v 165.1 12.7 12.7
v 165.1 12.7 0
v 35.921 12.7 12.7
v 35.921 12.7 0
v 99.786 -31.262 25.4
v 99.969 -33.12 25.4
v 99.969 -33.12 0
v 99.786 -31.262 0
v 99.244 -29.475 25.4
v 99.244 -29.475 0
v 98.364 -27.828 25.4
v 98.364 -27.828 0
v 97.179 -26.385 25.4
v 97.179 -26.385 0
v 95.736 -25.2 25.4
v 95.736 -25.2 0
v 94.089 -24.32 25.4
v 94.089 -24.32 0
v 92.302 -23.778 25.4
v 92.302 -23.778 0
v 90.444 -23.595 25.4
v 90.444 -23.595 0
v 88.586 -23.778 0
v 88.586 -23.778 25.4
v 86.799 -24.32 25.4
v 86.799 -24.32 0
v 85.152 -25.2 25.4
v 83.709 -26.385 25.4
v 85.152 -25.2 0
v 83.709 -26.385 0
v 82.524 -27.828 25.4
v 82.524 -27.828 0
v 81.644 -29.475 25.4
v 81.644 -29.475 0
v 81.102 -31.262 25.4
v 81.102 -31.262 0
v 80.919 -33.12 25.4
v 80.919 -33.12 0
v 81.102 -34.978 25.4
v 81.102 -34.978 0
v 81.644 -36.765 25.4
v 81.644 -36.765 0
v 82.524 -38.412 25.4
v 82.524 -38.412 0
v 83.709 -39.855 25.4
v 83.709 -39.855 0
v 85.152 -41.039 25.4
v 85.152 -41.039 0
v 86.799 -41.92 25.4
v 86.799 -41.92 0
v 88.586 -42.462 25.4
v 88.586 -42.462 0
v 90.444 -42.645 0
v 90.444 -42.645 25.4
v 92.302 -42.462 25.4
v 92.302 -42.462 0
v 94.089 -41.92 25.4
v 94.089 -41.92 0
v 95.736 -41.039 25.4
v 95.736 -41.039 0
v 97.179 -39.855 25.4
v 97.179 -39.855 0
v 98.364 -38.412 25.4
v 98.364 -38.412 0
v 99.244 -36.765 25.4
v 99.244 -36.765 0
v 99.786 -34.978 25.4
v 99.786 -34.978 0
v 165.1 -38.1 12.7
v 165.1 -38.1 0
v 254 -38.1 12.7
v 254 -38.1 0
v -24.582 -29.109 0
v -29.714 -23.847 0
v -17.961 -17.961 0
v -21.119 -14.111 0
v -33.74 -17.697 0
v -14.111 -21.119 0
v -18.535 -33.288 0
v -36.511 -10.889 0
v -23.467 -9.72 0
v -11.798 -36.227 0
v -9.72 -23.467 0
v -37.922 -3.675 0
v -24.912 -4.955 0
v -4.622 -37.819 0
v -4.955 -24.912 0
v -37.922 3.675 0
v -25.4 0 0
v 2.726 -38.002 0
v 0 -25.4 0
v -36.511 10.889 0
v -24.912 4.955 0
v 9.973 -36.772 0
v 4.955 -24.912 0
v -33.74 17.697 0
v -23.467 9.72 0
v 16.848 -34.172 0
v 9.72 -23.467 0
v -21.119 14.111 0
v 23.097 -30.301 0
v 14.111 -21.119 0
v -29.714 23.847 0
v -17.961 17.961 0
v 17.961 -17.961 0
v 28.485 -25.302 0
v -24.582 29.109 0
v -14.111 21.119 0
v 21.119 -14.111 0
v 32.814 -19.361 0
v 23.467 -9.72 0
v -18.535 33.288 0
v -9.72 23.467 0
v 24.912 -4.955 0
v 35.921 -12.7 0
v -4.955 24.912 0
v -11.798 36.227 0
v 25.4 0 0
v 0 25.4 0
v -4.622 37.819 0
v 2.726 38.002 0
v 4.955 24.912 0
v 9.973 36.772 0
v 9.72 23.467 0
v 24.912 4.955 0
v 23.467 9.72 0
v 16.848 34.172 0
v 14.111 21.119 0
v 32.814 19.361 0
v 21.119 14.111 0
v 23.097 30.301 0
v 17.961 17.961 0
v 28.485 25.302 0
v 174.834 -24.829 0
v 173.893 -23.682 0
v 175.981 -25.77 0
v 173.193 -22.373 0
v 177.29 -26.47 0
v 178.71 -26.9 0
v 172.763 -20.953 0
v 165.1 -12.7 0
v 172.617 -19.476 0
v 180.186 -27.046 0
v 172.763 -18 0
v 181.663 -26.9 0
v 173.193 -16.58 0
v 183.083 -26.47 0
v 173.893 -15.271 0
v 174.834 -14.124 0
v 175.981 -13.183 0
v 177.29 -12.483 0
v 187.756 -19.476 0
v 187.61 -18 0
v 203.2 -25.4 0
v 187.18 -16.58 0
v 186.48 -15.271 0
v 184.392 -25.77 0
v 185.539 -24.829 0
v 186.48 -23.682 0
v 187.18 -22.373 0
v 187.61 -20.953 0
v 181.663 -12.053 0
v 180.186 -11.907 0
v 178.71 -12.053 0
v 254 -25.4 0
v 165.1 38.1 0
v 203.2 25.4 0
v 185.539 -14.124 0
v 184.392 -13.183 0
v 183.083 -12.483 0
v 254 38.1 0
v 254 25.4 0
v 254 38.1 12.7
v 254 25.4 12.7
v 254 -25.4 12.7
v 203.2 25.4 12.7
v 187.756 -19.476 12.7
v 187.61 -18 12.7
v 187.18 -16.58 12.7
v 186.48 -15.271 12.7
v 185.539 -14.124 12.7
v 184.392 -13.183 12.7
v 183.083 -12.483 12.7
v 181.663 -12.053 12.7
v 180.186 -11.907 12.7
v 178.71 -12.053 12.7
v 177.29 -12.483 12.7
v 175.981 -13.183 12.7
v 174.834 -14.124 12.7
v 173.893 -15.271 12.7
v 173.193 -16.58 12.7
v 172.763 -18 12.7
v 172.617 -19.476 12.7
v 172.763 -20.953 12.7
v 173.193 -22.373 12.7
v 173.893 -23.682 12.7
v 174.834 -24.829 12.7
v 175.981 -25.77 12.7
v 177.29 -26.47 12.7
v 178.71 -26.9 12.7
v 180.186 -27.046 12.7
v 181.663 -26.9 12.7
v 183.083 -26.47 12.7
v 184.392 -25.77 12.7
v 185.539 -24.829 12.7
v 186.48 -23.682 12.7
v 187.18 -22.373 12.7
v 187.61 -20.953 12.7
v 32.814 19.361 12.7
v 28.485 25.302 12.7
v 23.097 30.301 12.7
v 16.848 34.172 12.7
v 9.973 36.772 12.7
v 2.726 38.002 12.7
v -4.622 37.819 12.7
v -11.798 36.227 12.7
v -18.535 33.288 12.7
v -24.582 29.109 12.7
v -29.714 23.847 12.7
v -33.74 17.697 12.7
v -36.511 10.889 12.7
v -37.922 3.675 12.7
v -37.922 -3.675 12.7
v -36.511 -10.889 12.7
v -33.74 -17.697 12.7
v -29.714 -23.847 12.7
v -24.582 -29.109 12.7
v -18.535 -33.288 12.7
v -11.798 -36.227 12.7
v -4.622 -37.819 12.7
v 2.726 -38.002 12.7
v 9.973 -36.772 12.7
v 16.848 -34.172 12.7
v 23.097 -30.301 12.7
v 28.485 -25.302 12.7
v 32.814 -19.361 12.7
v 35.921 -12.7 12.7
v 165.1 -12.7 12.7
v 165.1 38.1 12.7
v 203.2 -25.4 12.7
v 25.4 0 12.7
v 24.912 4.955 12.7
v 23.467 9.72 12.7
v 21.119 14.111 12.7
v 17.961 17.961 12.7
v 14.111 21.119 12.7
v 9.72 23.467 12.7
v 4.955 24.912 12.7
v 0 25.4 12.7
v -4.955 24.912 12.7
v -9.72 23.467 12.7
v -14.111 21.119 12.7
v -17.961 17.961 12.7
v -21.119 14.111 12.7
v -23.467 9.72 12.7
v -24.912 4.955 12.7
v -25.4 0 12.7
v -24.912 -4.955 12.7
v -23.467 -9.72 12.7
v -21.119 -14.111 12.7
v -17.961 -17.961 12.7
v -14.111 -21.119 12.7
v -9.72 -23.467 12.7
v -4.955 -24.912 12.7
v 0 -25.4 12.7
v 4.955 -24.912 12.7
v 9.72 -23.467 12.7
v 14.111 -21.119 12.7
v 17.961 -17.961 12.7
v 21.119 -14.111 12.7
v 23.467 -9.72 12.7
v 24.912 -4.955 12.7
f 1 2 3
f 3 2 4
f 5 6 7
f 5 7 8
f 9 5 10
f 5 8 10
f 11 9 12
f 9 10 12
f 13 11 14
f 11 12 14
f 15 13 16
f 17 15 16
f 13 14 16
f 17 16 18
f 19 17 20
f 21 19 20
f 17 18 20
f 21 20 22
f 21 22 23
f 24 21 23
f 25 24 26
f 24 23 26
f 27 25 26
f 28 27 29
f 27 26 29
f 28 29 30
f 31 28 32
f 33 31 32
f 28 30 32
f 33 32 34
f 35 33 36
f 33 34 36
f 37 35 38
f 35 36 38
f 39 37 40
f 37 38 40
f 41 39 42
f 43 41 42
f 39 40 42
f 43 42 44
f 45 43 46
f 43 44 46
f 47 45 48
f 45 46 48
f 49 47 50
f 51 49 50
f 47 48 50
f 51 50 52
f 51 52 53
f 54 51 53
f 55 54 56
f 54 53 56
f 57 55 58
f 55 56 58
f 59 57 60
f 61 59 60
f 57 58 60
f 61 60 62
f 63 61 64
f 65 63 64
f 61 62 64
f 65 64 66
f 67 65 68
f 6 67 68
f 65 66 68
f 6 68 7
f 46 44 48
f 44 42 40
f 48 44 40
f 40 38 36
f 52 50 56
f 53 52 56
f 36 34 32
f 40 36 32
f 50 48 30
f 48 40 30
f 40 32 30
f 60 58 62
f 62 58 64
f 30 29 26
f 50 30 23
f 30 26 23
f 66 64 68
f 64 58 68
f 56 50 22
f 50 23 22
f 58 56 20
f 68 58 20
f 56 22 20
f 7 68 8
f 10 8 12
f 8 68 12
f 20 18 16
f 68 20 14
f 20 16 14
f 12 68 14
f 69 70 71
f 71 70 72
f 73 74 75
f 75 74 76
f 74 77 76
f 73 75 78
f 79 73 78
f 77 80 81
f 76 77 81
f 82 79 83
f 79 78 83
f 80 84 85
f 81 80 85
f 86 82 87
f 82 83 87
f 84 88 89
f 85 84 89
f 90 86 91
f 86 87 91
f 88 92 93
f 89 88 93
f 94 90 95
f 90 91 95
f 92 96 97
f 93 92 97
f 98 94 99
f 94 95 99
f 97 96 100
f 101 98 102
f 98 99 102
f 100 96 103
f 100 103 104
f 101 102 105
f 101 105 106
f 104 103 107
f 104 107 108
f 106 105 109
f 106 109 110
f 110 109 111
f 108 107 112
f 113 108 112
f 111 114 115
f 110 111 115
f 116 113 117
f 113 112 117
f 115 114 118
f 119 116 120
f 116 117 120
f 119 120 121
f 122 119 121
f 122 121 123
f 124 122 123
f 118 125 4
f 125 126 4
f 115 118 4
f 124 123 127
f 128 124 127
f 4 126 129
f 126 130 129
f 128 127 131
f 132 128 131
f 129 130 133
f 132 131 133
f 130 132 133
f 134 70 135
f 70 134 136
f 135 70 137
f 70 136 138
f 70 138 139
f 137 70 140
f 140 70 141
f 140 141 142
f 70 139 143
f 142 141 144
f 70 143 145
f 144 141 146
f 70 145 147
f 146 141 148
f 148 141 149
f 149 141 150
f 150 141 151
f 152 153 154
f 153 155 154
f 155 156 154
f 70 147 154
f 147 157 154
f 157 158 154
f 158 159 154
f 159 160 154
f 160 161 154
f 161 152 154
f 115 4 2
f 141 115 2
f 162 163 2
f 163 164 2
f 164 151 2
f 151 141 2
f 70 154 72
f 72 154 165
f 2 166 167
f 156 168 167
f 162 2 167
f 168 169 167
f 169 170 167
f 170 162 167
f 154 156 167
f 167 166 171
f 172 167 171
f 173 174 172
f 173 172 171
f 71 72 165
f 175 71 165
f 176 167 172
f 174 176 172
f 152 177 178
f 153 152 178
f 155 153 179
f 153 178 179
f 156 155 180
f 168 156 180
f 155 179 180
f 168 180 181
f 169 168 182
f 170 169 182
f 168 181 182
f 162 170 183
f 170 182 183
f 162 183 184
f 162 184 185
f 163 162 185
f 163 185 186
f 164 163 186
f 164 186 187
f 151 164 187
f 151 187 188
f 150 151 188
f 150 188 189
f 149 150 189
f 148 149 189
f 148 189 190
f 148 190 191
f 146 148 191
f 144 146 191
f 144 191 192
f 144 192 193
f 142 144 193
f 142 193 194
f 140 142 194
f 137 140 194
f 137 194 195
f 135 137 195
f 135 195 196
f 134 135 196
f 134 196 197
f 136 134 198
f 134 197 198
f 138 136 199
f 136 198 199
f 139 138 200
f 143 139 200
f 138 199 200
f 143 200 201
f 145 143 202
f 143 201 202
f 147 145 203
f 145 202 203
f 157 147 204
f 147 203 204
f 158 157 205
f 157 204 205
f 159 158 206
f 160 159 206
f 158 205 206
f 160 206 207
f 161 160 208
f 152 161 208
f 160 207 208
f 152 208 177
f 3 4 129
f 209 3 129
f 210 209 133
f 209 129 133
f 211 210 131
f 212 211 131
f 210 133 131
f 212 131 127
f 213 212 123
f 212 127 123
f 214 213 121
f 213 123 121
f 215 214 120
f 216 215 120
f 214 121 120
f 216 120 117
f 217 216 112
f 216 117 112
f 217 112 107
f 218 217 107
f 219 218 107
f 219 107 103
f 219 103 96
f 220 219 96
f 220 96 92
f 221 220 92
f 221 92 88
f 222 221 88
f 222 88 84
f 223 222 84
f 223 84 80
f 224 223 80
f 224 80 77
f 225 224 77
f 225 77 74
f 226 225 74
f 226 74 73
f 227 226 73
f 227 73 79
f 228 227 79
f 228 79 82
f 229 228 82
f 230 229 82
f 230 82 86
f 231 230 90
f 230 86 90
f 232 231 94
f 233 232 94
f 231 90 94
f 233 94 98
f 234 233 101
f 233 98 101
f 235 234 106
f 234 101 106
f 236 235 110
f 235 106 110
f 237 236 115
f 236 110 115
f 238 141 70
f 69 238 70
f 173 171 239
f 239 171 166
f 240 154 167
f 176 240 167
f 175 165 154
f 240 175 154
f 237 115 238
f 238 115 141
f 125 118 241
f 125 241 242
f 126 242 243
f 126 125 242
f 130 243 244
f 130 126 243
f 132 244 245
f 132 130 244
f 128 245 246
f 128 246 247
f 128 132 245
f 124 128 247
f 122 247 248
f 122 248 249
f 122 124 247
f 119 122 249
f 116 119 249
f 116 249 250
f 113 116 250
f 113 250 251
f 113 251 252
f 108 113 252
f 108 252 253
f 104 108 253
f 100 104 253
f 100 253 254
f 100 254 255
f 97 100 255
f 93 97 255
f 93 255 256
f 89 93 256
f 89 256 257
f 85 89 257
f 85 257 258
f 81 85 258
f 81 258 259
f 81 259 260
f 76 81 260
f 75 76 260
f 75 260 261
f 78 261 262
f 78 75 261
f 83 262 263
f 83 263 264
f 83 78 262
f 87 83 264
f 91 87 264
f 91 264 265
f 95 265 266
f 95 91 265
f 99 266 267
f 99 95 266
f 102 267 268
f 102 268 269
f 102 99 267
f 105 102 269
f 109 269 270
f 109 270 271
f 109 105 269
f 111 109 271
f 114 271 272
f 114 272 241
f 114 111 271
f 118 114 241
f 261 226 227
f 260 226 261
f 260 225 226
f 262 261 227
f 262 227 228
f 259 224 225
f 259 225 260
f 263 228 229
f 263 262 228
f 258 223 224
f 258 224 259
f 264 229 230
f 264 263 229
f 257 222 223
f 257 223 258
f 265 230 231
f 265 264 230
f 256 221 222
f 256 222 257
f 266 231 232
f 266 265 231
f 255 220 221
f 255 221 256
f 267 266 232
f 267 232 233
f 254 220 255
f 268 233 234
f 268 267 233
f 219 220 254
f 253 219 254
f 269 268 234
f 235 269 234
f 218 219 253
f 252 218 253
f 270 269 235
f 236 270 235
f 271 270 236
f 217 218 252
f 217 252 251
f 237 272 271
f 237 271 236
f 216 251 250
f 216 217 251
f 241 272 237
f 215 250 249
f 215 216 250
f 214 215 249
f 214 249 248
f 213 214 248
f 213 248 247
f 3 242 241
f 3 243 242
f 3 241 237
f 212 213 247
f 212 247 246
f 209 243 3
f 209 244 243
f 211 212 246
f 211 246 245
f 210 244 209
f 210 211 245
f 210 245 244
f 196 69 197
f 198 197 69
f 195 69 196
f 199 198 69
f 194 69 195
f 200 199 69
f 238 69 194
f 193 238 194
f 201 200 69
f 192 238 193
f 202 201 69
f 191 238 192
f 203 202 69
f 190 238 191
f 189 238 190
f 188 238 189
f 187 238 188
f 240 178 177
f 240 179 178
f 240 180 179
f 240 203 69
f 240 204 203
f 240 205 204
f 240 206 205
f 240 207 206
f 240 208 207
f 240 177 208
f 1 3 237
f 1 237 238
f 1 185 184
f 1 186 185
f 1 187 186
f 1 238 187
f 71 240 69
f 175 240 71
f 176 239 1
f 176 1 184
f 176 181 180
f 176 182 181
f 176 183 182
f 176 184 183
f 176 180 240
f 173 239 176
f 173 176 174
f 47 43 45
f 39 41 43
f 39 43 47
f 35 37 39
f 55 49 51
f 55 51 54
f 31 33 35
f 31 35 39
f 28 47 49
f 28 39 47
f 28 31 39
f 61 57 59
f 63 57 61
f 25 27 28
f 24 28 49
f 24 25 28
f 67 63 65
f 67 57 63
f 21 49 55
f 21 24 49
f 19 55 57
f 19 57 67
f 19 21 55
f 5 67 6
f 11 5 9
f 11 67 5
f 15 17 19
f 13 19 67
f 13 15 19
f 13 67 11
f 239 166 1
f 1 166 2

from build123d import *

# Parameters (mm, degrees)
F0_R        = 25.4
F0_R_2      = 9.525
F1_DEPTH    = 25.4
F2_R        = 7.569296
F3_DEPTH    = 25.4
F1_FACE_R   = 7.569296
F1_FACE_R_2 = 25.4
F4_DEPTH    = 12.7


with BuildPart() as f1:
    # F0 (on Top) → F1 (new body)
    with BuildSketch(Plane.XY):
        with BuildLine():
            ThreePointArc((35.921024, -12.7), (37.551305, -6.442785), (38.1, 0))
            ThreePointArc((38.1, 0), (37.551305, 6.442785), (35.921024, 12.7))
            ThreePointArc((35.921024, 12.7), (-38.1, 0), (35.921024, -12.7))
        make_face()
        Circle(F0_R, mode=Mode.SUBTRACT)
        with BuildLine():
            ThreePointArc((35.921024, 12.7), (37.551305, 6.442785), (38.1, 0))
            ThreePointArc((38.1, 0), (37.551305, -6.442785), (35.921024, -12.7))
            Line((35.921024, -12.7), (165.1, -12.7))
            Line((165.1, -12.7), (165.1, -38.1))
            Line((165.1, -38.1), (254, -38.1))
            Line((254, -38.1), (254, -25.4))
            Line((254, -25.4), (203.2, -25.4))
            Line((203.2, -25.4), (203.2, 25.4))
            Line((203.2, 25.4), (254, 25.4))
            Line((254, 25.4), (254, 38.1))
            Line((254, 38.1), (165.1, 38.1))
            Line((165.1, 38.1), (165.1, 12.7))
            Line((165.1, 12.7), (35.921024, 12.7))
        make_face()
        with Locations((90.443961, -33.119742)):
            Circle(F0_R_2)
    extrude(amount=F1_DEPTH)

    # F2 (on face) → F3 (cut)
    with BuildSketch(Plane.XY.offset(25.4)):
        with Locations((180.186421, -19.476419)):
            Circle(F2_R)
    extrude(amount=-F3_DEPTH, mode=Mode.SUBTRACT)

    # F2 (on face) + F1_face (on face) → F4 (cut, symmetric)
    with BuildSketch(Plane.XY.offset(25.4)):
        with Locations((180.186421, 19.476419)):
            Circle(F2_R)
        with Locations((180.186421, -19.476419)):
            Circle(F2_R)
    with BuildSketch(Plane(origin=(116.137443, 0, 25.4), x_dir=(1, 0, 0), z_dir=(0, 0, 1))):
        with BuildLine():
            ThreePointArc((-80.216419, 12.7), (-154.237443, 0), (-80.216419, -12.7))
            Line((-80.216419, -12.7), (48.962557, -12.7))
            Line((48.962557, -12.7), (48.962557, -38.1))
            Line((48.962557, -38.1), (137.862557, -38.1))
            Line((137.862557, -38.1), (137.862557, -25.4))
            Line((137.862557, -25.4), (87.062557, -25.4))
            Line((87.062557, -25.4), (87.062557, 25.4))
            Line((87.062557, 25.4), (137.862557, 25.4))
            Line((137.862557, 25.4), (137.862557, 38.1))
            Line((137.862557, 38.1), (48.962557, 38.1))
            Line((48.962557, 38.1), (48.962557, 12.7))
            Line((48.962557, 12.7), (-80.216419, 12.7))
        make_face()
        with Locations((64.048978, -19.476419)):
            Circle(F1_FACE_R, mode=Mode.SUBTRACT)
        with Locations((-116.137443, 0)):
            Circle(F1_FACE_R_2, mode=Mode.SUBTRACT)
    extrude(amount=F4_DEPTH, both=True, mode=Mode.SUBTRACT)


solid = f1.part
